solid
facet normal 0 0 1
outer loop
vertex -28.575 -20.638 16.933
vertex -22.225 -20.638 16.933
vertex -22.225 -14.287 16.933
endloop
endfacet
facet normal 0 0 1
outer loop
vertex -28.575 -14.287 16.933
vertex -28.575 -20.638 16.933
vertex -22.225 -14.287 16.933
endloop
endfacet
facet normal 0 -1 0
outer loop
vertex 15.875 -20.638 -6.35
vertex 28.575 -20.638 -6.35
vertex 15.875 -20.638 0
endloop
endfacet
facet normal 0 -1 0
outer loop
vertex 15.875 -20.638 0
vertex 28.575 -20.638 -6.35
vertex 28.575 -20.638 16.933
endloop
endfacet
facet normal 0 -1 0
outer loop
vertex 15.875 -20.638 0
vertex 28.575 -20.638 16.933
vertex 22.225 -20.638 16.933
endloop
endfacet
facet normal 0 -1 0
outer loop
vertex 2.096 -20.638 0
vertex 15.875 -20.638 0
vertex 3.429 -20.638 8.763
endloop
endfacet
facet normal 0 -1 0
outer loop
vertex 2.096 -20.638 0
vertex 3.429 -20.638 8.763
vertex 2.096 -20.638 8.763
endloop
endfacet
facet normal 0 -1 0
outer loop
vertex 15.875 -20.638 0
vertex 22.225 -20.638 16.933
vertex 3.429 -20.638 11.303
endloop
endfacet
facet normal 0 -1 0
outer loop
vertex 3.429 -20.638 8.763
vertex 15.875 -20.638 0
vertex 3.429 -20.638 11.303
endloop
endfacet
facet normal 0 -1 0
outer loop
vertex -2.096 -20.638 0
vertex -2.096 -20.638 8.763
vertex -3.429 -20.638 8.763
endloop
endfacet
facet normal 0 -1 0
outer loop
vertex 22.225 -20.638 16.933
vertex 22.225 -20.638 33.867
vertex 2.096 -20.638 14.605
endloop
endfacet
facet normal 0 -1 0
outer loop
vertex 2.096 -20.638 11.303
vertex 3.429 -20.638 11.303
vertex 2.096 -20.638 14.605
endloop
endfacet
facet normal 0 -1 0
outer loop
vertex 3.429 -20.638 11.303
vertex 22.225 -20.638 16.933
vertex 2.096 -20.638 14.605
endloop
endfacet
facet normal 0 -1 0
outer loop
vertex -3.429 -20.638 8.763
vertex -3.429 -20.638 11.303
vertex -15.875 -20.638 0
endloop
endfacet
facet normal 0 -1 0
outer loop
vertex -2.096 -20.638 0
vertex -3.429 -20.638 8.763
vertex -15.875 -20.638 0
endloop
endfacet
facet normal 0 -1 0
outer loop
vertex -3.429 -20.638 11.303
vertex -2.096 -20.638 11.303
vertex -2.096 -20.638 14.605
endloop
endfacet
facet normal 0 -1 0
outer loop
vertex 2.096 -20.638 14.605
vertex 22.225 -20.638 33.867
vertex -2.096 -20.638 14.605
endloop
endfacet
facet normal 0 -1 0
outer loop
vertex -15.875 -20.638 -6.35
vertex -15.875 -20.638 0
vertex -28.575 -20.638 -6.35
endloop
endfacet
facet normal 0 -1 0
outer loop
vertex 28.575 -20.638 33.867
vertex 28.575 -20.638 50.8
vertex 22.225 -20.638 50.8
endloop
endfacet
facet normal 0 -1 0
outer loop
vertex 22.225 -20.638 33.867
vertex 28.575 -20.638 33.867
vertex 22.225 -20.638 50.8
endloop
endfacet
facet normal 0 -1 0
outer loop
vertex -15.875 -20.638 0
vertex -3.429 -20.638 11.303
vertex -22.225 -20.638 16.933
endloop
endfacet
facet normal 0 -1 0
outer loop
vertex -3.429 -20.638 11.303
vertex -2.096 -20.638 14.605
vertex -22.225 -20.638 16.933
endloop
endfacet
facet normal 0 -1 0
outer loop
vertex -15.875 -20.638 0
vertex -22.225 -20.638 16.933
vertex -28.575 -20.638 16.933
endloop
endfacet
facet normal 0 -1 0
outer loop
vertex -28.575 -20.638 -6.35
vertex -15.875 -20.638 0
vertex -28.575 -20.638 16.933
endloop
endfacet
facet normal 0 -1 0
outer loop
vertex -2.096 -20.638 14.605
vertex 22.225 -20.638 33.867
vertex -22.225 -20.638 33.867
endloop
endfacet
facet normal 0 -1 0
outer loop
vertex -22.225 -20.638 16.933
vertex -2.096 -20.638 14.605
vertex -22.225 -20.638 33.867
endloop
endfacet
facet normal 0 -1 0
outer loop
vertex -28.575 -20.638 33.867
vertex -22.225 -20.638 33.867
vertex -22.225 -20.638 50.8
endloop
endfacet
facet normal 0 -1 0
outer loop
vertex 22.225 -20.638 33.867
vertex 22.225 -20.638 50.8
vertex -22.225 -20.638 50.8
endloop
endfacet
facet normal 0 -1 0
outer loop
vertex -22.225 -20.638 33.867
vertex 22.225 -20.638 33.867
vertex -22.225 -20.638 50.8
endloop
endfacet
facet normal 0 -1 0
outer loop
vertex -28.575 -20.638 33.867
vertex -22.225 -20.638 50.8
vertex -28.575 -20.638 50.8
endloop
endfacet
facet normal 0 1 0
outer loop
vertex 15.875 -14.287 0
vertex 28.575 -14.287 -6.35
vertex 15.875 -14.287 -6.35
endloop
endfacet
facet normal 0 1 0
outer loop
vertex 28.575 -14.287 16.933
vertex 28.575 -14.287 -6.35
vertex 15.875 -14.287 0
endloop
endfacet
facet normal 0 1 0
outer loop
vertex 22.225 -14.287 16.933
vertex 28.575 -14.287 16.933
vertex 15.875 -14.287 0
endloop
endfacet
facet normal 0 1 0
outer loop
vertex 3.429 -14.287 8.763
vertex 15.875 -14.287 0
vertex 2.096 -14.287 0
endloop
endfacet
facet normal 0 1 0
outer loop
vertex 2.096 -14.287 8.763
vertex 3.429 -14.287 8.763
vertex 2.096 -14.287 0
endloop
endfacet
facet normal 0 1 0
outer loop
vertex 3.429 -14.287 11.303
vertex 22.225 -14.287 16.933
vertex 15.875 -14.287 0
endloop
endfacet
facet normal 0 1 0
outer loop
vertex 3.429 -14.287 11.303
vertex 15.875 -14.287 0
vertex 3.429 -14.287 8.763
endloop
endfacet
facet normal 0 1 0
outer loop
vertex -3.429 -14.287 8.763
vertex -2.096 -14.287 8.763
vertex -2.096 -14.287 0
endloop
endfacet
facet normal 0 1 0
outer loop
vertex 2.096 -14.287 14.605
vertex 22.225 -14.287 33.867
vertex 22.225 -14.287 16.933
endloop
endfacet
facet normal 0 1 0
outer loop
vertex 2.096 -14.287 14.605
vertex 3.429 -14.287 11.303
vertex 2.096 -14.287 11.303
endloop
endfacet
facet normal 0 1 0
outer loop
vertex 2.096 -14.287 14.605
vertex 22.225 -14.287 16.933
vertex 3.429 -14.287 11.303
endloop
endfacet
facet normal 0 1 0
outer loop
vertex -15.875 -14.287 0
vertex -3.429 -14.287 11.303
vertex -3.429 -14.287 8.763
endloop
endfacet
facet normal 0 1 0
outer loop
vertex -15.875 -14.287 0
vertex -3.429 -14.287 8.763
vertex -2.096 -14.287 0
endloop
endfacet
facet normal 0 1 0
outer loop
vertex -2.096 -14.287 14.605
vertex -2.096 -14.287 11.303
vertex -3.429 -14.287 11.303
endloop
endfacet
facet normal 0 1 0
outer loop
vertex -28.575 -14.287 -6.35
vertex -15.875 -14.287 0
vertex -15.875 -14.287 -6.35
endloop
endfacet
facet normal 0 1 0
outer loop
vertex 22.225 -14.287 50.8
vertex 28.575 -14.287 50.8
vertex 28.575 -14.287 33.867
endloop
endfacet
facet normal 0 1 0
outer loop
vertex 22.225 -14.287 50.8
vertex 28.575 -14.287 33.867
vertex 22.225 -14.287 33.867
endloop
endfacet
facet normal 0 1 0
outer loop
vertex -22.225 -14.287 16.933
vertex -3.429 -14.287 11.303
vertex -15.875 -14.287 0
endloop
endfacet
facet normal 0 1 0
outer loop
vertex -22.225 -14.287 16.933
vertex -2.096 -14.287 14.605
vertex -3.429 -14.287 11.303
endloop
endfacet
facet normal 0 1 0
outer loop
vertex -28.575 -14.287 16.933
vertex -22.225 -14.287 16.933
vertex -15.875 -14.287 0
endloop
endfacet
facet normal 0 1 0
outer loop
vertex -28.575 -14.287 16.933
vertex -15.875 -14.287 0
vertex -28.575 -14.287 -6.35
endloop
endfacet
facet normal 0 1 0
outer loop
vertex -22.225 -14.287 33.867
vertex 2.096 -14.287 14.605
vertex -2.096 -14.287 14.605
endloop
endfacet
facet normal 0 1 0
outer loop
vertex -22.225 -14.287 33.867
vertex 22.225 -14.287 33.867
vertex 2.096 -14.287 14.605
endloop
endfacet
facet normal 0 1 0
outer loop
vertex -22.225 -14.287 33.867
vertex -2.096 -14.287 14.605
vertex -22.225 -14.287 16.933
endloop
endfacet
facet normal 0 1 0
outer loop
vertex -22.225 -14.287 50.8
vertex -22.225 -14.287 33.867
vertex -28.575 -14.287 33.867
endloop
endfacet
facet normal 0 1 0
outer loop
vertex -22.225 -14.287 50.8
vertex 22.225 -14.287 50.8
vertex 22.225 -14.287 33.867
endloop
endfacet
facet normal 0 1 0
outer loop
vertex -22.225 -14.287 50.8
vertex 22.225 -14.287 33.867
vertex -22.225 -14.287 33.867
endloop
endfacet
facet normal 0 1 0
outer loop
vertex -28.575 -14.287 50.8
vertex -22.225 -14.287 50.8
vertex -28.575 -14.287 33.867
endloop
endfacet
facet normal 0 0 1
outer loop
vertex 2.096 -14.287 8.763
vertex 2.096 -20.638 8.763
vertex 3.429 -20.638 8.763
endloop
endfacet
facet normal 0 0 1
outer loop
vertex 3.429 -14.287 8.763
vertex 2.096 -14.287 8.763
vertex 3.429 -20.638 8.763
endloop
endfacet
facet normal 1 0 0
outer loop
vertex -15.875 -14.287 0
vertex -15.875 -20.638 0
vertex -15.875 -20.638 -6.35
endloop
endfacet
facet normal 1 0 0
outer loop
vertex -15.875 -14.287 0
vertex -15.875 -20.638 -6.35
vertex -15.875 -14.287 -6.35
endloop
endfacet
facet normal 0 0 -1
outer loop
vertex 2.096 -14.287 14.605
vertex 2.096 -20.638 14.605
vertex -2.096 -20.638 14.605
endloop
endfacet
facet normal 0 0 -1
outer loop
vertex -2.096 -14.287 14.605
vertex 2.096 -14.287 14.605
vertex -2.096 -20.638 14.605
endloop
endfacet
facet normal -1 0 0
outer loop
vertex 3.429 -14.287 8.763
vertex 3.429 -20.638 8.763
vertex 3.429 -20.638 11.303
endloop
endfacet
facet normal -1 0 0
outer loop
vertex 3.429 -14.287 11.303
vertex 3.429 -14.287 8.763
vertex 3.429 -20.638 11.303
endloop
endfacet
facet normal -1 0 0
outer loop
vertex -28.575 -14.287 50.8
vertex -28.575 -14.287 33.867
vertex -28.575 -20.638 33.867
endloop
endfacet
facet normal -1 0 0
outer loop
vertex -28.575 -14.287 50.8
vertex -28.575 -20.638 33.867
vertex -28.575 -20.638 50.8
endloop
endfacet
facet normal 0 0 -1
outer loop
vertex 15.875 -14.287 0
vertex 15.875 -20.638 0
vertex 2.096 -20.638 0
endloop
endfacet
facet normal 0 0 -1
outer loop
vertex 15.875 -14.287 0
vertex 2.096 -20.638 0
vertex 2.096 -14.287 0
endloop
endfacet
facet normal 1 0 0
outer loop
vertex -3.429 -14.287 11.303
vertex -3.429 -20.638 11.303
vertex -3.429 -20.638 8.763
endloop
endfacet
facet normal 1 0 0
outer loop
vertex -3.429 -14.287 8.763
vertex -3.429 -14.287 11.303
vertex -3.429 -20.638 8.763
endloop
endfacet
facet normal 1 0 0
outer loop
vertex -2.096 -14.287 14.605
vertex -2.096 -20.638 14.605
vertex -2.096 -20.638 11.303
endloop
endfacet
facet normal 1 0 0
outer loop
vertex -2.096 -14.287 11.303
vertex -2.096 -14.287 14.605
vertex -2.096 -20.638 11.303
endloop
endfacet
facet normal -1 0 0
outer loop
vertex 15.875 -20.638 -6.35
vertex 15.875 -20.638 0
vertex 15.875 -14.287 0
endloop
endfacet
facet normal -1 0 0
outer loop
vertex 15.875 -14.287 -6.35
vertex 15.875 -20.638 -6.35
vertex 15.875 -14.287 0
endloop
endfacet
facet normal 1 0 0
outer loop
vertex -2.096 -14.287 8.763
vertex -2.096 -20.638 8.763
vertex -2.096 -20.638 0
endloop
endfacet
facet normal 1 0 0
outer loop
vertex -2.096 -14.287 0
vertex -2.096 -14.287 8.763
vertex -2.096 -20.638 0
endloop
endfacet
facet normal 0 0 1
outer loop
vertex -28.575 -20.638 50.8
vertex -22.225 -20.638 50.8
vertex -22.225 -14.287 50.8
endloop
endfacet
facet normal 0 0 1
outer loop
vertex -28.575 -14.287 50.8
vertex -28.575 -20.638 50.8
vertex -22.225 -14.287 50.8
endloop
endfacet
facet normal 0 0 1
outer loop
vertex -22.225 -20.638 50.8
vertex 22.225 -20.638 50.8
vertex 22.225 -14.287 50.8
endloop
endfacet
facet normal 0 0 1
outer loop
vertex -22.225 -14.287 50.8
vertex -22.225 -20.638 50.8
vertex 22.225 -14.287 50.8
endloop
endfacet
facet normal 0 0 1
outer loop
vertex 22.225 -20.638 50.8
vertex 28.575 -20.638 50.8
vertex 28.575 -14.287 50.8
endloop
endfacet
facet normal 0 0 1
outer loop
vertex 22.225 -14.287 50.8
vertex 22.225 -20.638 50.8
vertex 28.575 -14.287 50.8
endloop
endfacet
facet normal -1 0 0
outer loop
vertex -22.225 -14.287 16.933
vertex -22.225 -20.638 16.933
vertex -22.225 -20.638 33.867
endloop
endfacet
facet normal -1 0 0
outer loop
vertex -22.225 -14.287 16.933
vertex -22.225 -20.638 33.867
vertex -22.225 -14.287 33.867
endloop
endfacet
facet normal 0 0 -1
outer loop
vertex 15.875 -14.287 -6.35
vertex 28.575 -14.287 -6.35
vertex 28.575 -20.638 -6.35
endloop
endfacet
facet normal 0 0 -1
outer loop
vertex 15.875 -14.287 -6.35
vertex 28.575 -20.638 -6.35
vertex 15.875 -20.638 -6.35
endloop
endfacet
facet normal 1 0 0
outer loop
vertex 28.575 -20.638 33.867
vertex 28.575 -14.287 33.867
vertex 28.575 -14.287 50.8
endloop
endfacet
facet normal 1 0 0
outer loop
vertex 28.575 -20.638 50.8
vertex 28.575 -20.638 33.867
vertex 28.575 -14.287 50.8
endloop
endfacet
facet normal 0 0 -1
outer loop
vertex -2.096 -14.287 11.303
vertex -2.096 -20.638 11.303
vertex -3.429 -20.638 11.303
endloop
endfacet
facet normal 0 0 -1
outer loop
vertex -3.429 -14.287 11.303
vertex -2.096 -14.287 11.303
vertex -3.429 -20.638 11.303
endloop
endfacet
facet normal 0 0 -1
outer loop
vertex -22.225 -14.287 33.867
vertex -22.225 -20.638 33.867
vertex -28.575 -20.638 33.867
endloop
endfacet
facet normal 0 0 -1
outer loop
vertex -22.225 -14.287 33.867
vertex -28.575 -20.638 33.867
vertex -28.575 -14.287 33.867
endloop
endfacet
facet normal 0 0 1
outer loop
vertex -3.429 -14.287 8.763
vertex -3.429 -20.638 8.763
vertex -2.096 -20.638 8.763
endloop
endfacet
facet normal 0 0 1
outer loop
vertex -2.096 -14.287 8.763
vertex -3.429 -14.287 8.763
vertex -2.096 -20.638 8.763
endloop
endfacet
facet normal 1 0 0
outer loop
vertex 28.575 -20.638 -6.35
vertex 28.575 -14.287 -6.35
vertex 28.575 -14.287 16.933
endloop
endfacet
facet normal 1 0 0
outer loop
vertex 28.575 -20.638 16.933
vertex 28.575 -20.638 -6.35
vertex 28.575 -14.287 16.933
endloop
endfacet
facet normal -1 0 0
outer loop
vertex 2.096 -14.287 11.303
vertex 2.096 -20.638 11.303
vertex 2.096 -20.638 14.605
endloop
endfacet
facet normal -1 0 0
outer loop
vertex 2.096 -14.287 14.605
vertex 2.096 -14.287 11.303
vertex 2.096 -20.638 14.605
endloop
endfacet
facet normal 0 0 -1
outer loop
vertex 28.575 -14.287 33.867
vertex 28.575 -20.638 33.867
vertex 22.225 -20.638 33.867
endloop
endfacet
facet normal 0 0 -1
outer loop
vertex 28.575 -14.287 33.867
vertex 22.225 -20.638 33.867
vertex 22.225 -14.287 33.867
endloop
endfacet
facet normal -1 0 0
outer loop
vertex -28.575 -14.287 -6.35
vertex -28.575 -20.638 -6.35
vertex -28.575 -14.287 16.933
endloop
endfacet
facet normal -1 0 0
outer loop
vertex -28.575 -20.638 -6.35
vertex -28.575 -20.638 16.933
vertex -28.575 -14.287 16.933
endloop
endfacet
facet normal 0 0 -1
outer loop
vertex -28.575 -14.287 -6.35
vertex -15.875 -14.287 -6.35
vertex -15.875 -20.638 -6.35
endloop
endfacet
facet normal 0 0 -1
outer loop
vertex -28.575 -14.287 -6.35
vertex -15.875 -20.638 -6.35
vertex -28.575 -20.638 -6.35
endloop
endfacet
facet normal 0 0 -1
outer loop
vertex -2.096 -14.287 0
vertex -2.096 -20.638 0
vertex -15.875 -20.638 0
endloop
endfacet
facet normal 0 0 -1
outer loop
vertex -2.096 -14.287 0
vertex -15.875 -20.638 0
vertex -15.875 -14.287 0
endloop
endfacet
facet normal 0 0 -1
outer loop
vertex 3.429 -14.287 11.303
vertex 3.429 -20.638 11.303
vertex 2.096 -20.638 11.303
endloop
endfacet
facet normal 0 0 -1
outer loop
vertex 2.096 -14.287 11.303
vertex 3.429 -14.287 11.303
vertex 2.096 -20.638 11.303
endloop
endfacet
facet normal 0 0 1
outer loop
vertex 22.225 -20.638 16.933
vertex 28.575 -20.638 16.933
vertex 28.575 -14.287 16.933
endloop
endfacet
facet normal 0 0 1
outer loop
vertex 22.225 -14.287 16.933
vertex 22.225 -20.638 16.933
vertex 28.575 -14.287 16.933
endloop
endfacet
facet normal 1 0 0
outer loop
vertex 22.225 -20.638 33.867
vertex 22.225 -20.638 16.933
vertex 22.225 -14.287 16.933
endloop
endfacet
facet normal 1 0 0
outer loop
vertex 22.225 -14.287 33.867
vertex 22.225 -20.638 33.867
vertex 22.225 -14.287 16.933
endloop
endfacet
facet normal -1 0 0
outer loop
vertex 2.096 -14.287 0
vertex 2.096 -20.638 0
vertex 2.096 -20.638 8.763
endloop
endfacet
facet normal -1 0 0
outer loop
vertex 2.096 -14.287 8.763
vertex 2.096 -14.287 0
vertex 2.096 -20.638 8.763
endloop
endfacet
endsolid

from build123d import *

# Parameters (mm, degrees)
SKETCH1_W                = 44.45
SKETCH1_H                = 6.35
BOSS_EXTRUDE1_DEPTH      = 50.8
BOSS_EXTRUDE2_DEPTH      = 6.35
BOSS_EXTRUDE2_DEPTH_BACK = 50.8
SKETCH2_W                = 16.933333333
SKETCH2_H                = 6.35
SKETCH4_W                = 12.7
SKETCH4_H                = 6.35
BOSS_EXTRUDE4_DEPTH      = 6.35
CUT_EXTRUDE1_DEPTH       = 59.630138368


with BuildPart() as part:
    # Sketch1 → Boss-Extrude1 (new body)
    with BuildSketch(Plane.XY):
        with Locations((0, -17.4625)):
            Rectangle(SKETCH1_W, SKETCH1_H)
    extrude(amount=BOSS_EXTRUDE1_DEPTH)

    # Sketch2 → Boss-Extrude2 (add, two sides: drawn at the far end of the back side and taken through both)
    with BuildSketch(Plane.ZY.offset(22.225).offset(-BOSS_EXTRUDE2_DEPTH_BACK)):
        with Locations((42.333333334, -17.4625)):
            Rectangle(SKETCH2_W, SKETCH2_H)
        with Locations((8.466666667, -17.4625)):
            Rectangle(SKETCH2_W, SKETCH2_H)
    extrude(amount=BOSS_EXTRUDE2_DEPTH + BOSS_EXTRUDE2_DEPTH_BACK)

    # Sketch4 → Boss-Extrude4 (add)
    with BuildSketch(Plane(origin=(0, 0, 0), x_dir=(-1, 0, 0), z_dir=(0, 0, -1))):
        with Locations((22.225, -17.4625)):
            Rectangle(SKETCH4_W, SKETCH4_H)
        with Locations((-22.225, -17.4625)):
            Rectangle(SKETCH4_W, SKETCH4_H)
    extrude(amount=BOSS_EXTRUDE4_DEPTH)

    # Sketch5 → Cut-Extrude1 (cut, through all)
    with BuildSketch(Plane(origin=(0, -20.6375, 0), x_dir=(-1, 0, 0), z_dir=(0, -1, 0))):
        Polygon((2.0955, 0), (-2.0955, 0), (-2.0955, -8.763), (-3.429, -8.763), (-3.429, -11.303), (-2.0955, -11.303), (-2.0955, -14.605), (2.0955, -14.605), (2.0955, -11.303), (3.429, -11.303), (3.429, -8.763), (2.0955, -8.763), align=None)
    extrude(amount=-CUT_EXTRUDE1_DEPTH, mode=Mode.SUBTRACT)


solid = part.part
